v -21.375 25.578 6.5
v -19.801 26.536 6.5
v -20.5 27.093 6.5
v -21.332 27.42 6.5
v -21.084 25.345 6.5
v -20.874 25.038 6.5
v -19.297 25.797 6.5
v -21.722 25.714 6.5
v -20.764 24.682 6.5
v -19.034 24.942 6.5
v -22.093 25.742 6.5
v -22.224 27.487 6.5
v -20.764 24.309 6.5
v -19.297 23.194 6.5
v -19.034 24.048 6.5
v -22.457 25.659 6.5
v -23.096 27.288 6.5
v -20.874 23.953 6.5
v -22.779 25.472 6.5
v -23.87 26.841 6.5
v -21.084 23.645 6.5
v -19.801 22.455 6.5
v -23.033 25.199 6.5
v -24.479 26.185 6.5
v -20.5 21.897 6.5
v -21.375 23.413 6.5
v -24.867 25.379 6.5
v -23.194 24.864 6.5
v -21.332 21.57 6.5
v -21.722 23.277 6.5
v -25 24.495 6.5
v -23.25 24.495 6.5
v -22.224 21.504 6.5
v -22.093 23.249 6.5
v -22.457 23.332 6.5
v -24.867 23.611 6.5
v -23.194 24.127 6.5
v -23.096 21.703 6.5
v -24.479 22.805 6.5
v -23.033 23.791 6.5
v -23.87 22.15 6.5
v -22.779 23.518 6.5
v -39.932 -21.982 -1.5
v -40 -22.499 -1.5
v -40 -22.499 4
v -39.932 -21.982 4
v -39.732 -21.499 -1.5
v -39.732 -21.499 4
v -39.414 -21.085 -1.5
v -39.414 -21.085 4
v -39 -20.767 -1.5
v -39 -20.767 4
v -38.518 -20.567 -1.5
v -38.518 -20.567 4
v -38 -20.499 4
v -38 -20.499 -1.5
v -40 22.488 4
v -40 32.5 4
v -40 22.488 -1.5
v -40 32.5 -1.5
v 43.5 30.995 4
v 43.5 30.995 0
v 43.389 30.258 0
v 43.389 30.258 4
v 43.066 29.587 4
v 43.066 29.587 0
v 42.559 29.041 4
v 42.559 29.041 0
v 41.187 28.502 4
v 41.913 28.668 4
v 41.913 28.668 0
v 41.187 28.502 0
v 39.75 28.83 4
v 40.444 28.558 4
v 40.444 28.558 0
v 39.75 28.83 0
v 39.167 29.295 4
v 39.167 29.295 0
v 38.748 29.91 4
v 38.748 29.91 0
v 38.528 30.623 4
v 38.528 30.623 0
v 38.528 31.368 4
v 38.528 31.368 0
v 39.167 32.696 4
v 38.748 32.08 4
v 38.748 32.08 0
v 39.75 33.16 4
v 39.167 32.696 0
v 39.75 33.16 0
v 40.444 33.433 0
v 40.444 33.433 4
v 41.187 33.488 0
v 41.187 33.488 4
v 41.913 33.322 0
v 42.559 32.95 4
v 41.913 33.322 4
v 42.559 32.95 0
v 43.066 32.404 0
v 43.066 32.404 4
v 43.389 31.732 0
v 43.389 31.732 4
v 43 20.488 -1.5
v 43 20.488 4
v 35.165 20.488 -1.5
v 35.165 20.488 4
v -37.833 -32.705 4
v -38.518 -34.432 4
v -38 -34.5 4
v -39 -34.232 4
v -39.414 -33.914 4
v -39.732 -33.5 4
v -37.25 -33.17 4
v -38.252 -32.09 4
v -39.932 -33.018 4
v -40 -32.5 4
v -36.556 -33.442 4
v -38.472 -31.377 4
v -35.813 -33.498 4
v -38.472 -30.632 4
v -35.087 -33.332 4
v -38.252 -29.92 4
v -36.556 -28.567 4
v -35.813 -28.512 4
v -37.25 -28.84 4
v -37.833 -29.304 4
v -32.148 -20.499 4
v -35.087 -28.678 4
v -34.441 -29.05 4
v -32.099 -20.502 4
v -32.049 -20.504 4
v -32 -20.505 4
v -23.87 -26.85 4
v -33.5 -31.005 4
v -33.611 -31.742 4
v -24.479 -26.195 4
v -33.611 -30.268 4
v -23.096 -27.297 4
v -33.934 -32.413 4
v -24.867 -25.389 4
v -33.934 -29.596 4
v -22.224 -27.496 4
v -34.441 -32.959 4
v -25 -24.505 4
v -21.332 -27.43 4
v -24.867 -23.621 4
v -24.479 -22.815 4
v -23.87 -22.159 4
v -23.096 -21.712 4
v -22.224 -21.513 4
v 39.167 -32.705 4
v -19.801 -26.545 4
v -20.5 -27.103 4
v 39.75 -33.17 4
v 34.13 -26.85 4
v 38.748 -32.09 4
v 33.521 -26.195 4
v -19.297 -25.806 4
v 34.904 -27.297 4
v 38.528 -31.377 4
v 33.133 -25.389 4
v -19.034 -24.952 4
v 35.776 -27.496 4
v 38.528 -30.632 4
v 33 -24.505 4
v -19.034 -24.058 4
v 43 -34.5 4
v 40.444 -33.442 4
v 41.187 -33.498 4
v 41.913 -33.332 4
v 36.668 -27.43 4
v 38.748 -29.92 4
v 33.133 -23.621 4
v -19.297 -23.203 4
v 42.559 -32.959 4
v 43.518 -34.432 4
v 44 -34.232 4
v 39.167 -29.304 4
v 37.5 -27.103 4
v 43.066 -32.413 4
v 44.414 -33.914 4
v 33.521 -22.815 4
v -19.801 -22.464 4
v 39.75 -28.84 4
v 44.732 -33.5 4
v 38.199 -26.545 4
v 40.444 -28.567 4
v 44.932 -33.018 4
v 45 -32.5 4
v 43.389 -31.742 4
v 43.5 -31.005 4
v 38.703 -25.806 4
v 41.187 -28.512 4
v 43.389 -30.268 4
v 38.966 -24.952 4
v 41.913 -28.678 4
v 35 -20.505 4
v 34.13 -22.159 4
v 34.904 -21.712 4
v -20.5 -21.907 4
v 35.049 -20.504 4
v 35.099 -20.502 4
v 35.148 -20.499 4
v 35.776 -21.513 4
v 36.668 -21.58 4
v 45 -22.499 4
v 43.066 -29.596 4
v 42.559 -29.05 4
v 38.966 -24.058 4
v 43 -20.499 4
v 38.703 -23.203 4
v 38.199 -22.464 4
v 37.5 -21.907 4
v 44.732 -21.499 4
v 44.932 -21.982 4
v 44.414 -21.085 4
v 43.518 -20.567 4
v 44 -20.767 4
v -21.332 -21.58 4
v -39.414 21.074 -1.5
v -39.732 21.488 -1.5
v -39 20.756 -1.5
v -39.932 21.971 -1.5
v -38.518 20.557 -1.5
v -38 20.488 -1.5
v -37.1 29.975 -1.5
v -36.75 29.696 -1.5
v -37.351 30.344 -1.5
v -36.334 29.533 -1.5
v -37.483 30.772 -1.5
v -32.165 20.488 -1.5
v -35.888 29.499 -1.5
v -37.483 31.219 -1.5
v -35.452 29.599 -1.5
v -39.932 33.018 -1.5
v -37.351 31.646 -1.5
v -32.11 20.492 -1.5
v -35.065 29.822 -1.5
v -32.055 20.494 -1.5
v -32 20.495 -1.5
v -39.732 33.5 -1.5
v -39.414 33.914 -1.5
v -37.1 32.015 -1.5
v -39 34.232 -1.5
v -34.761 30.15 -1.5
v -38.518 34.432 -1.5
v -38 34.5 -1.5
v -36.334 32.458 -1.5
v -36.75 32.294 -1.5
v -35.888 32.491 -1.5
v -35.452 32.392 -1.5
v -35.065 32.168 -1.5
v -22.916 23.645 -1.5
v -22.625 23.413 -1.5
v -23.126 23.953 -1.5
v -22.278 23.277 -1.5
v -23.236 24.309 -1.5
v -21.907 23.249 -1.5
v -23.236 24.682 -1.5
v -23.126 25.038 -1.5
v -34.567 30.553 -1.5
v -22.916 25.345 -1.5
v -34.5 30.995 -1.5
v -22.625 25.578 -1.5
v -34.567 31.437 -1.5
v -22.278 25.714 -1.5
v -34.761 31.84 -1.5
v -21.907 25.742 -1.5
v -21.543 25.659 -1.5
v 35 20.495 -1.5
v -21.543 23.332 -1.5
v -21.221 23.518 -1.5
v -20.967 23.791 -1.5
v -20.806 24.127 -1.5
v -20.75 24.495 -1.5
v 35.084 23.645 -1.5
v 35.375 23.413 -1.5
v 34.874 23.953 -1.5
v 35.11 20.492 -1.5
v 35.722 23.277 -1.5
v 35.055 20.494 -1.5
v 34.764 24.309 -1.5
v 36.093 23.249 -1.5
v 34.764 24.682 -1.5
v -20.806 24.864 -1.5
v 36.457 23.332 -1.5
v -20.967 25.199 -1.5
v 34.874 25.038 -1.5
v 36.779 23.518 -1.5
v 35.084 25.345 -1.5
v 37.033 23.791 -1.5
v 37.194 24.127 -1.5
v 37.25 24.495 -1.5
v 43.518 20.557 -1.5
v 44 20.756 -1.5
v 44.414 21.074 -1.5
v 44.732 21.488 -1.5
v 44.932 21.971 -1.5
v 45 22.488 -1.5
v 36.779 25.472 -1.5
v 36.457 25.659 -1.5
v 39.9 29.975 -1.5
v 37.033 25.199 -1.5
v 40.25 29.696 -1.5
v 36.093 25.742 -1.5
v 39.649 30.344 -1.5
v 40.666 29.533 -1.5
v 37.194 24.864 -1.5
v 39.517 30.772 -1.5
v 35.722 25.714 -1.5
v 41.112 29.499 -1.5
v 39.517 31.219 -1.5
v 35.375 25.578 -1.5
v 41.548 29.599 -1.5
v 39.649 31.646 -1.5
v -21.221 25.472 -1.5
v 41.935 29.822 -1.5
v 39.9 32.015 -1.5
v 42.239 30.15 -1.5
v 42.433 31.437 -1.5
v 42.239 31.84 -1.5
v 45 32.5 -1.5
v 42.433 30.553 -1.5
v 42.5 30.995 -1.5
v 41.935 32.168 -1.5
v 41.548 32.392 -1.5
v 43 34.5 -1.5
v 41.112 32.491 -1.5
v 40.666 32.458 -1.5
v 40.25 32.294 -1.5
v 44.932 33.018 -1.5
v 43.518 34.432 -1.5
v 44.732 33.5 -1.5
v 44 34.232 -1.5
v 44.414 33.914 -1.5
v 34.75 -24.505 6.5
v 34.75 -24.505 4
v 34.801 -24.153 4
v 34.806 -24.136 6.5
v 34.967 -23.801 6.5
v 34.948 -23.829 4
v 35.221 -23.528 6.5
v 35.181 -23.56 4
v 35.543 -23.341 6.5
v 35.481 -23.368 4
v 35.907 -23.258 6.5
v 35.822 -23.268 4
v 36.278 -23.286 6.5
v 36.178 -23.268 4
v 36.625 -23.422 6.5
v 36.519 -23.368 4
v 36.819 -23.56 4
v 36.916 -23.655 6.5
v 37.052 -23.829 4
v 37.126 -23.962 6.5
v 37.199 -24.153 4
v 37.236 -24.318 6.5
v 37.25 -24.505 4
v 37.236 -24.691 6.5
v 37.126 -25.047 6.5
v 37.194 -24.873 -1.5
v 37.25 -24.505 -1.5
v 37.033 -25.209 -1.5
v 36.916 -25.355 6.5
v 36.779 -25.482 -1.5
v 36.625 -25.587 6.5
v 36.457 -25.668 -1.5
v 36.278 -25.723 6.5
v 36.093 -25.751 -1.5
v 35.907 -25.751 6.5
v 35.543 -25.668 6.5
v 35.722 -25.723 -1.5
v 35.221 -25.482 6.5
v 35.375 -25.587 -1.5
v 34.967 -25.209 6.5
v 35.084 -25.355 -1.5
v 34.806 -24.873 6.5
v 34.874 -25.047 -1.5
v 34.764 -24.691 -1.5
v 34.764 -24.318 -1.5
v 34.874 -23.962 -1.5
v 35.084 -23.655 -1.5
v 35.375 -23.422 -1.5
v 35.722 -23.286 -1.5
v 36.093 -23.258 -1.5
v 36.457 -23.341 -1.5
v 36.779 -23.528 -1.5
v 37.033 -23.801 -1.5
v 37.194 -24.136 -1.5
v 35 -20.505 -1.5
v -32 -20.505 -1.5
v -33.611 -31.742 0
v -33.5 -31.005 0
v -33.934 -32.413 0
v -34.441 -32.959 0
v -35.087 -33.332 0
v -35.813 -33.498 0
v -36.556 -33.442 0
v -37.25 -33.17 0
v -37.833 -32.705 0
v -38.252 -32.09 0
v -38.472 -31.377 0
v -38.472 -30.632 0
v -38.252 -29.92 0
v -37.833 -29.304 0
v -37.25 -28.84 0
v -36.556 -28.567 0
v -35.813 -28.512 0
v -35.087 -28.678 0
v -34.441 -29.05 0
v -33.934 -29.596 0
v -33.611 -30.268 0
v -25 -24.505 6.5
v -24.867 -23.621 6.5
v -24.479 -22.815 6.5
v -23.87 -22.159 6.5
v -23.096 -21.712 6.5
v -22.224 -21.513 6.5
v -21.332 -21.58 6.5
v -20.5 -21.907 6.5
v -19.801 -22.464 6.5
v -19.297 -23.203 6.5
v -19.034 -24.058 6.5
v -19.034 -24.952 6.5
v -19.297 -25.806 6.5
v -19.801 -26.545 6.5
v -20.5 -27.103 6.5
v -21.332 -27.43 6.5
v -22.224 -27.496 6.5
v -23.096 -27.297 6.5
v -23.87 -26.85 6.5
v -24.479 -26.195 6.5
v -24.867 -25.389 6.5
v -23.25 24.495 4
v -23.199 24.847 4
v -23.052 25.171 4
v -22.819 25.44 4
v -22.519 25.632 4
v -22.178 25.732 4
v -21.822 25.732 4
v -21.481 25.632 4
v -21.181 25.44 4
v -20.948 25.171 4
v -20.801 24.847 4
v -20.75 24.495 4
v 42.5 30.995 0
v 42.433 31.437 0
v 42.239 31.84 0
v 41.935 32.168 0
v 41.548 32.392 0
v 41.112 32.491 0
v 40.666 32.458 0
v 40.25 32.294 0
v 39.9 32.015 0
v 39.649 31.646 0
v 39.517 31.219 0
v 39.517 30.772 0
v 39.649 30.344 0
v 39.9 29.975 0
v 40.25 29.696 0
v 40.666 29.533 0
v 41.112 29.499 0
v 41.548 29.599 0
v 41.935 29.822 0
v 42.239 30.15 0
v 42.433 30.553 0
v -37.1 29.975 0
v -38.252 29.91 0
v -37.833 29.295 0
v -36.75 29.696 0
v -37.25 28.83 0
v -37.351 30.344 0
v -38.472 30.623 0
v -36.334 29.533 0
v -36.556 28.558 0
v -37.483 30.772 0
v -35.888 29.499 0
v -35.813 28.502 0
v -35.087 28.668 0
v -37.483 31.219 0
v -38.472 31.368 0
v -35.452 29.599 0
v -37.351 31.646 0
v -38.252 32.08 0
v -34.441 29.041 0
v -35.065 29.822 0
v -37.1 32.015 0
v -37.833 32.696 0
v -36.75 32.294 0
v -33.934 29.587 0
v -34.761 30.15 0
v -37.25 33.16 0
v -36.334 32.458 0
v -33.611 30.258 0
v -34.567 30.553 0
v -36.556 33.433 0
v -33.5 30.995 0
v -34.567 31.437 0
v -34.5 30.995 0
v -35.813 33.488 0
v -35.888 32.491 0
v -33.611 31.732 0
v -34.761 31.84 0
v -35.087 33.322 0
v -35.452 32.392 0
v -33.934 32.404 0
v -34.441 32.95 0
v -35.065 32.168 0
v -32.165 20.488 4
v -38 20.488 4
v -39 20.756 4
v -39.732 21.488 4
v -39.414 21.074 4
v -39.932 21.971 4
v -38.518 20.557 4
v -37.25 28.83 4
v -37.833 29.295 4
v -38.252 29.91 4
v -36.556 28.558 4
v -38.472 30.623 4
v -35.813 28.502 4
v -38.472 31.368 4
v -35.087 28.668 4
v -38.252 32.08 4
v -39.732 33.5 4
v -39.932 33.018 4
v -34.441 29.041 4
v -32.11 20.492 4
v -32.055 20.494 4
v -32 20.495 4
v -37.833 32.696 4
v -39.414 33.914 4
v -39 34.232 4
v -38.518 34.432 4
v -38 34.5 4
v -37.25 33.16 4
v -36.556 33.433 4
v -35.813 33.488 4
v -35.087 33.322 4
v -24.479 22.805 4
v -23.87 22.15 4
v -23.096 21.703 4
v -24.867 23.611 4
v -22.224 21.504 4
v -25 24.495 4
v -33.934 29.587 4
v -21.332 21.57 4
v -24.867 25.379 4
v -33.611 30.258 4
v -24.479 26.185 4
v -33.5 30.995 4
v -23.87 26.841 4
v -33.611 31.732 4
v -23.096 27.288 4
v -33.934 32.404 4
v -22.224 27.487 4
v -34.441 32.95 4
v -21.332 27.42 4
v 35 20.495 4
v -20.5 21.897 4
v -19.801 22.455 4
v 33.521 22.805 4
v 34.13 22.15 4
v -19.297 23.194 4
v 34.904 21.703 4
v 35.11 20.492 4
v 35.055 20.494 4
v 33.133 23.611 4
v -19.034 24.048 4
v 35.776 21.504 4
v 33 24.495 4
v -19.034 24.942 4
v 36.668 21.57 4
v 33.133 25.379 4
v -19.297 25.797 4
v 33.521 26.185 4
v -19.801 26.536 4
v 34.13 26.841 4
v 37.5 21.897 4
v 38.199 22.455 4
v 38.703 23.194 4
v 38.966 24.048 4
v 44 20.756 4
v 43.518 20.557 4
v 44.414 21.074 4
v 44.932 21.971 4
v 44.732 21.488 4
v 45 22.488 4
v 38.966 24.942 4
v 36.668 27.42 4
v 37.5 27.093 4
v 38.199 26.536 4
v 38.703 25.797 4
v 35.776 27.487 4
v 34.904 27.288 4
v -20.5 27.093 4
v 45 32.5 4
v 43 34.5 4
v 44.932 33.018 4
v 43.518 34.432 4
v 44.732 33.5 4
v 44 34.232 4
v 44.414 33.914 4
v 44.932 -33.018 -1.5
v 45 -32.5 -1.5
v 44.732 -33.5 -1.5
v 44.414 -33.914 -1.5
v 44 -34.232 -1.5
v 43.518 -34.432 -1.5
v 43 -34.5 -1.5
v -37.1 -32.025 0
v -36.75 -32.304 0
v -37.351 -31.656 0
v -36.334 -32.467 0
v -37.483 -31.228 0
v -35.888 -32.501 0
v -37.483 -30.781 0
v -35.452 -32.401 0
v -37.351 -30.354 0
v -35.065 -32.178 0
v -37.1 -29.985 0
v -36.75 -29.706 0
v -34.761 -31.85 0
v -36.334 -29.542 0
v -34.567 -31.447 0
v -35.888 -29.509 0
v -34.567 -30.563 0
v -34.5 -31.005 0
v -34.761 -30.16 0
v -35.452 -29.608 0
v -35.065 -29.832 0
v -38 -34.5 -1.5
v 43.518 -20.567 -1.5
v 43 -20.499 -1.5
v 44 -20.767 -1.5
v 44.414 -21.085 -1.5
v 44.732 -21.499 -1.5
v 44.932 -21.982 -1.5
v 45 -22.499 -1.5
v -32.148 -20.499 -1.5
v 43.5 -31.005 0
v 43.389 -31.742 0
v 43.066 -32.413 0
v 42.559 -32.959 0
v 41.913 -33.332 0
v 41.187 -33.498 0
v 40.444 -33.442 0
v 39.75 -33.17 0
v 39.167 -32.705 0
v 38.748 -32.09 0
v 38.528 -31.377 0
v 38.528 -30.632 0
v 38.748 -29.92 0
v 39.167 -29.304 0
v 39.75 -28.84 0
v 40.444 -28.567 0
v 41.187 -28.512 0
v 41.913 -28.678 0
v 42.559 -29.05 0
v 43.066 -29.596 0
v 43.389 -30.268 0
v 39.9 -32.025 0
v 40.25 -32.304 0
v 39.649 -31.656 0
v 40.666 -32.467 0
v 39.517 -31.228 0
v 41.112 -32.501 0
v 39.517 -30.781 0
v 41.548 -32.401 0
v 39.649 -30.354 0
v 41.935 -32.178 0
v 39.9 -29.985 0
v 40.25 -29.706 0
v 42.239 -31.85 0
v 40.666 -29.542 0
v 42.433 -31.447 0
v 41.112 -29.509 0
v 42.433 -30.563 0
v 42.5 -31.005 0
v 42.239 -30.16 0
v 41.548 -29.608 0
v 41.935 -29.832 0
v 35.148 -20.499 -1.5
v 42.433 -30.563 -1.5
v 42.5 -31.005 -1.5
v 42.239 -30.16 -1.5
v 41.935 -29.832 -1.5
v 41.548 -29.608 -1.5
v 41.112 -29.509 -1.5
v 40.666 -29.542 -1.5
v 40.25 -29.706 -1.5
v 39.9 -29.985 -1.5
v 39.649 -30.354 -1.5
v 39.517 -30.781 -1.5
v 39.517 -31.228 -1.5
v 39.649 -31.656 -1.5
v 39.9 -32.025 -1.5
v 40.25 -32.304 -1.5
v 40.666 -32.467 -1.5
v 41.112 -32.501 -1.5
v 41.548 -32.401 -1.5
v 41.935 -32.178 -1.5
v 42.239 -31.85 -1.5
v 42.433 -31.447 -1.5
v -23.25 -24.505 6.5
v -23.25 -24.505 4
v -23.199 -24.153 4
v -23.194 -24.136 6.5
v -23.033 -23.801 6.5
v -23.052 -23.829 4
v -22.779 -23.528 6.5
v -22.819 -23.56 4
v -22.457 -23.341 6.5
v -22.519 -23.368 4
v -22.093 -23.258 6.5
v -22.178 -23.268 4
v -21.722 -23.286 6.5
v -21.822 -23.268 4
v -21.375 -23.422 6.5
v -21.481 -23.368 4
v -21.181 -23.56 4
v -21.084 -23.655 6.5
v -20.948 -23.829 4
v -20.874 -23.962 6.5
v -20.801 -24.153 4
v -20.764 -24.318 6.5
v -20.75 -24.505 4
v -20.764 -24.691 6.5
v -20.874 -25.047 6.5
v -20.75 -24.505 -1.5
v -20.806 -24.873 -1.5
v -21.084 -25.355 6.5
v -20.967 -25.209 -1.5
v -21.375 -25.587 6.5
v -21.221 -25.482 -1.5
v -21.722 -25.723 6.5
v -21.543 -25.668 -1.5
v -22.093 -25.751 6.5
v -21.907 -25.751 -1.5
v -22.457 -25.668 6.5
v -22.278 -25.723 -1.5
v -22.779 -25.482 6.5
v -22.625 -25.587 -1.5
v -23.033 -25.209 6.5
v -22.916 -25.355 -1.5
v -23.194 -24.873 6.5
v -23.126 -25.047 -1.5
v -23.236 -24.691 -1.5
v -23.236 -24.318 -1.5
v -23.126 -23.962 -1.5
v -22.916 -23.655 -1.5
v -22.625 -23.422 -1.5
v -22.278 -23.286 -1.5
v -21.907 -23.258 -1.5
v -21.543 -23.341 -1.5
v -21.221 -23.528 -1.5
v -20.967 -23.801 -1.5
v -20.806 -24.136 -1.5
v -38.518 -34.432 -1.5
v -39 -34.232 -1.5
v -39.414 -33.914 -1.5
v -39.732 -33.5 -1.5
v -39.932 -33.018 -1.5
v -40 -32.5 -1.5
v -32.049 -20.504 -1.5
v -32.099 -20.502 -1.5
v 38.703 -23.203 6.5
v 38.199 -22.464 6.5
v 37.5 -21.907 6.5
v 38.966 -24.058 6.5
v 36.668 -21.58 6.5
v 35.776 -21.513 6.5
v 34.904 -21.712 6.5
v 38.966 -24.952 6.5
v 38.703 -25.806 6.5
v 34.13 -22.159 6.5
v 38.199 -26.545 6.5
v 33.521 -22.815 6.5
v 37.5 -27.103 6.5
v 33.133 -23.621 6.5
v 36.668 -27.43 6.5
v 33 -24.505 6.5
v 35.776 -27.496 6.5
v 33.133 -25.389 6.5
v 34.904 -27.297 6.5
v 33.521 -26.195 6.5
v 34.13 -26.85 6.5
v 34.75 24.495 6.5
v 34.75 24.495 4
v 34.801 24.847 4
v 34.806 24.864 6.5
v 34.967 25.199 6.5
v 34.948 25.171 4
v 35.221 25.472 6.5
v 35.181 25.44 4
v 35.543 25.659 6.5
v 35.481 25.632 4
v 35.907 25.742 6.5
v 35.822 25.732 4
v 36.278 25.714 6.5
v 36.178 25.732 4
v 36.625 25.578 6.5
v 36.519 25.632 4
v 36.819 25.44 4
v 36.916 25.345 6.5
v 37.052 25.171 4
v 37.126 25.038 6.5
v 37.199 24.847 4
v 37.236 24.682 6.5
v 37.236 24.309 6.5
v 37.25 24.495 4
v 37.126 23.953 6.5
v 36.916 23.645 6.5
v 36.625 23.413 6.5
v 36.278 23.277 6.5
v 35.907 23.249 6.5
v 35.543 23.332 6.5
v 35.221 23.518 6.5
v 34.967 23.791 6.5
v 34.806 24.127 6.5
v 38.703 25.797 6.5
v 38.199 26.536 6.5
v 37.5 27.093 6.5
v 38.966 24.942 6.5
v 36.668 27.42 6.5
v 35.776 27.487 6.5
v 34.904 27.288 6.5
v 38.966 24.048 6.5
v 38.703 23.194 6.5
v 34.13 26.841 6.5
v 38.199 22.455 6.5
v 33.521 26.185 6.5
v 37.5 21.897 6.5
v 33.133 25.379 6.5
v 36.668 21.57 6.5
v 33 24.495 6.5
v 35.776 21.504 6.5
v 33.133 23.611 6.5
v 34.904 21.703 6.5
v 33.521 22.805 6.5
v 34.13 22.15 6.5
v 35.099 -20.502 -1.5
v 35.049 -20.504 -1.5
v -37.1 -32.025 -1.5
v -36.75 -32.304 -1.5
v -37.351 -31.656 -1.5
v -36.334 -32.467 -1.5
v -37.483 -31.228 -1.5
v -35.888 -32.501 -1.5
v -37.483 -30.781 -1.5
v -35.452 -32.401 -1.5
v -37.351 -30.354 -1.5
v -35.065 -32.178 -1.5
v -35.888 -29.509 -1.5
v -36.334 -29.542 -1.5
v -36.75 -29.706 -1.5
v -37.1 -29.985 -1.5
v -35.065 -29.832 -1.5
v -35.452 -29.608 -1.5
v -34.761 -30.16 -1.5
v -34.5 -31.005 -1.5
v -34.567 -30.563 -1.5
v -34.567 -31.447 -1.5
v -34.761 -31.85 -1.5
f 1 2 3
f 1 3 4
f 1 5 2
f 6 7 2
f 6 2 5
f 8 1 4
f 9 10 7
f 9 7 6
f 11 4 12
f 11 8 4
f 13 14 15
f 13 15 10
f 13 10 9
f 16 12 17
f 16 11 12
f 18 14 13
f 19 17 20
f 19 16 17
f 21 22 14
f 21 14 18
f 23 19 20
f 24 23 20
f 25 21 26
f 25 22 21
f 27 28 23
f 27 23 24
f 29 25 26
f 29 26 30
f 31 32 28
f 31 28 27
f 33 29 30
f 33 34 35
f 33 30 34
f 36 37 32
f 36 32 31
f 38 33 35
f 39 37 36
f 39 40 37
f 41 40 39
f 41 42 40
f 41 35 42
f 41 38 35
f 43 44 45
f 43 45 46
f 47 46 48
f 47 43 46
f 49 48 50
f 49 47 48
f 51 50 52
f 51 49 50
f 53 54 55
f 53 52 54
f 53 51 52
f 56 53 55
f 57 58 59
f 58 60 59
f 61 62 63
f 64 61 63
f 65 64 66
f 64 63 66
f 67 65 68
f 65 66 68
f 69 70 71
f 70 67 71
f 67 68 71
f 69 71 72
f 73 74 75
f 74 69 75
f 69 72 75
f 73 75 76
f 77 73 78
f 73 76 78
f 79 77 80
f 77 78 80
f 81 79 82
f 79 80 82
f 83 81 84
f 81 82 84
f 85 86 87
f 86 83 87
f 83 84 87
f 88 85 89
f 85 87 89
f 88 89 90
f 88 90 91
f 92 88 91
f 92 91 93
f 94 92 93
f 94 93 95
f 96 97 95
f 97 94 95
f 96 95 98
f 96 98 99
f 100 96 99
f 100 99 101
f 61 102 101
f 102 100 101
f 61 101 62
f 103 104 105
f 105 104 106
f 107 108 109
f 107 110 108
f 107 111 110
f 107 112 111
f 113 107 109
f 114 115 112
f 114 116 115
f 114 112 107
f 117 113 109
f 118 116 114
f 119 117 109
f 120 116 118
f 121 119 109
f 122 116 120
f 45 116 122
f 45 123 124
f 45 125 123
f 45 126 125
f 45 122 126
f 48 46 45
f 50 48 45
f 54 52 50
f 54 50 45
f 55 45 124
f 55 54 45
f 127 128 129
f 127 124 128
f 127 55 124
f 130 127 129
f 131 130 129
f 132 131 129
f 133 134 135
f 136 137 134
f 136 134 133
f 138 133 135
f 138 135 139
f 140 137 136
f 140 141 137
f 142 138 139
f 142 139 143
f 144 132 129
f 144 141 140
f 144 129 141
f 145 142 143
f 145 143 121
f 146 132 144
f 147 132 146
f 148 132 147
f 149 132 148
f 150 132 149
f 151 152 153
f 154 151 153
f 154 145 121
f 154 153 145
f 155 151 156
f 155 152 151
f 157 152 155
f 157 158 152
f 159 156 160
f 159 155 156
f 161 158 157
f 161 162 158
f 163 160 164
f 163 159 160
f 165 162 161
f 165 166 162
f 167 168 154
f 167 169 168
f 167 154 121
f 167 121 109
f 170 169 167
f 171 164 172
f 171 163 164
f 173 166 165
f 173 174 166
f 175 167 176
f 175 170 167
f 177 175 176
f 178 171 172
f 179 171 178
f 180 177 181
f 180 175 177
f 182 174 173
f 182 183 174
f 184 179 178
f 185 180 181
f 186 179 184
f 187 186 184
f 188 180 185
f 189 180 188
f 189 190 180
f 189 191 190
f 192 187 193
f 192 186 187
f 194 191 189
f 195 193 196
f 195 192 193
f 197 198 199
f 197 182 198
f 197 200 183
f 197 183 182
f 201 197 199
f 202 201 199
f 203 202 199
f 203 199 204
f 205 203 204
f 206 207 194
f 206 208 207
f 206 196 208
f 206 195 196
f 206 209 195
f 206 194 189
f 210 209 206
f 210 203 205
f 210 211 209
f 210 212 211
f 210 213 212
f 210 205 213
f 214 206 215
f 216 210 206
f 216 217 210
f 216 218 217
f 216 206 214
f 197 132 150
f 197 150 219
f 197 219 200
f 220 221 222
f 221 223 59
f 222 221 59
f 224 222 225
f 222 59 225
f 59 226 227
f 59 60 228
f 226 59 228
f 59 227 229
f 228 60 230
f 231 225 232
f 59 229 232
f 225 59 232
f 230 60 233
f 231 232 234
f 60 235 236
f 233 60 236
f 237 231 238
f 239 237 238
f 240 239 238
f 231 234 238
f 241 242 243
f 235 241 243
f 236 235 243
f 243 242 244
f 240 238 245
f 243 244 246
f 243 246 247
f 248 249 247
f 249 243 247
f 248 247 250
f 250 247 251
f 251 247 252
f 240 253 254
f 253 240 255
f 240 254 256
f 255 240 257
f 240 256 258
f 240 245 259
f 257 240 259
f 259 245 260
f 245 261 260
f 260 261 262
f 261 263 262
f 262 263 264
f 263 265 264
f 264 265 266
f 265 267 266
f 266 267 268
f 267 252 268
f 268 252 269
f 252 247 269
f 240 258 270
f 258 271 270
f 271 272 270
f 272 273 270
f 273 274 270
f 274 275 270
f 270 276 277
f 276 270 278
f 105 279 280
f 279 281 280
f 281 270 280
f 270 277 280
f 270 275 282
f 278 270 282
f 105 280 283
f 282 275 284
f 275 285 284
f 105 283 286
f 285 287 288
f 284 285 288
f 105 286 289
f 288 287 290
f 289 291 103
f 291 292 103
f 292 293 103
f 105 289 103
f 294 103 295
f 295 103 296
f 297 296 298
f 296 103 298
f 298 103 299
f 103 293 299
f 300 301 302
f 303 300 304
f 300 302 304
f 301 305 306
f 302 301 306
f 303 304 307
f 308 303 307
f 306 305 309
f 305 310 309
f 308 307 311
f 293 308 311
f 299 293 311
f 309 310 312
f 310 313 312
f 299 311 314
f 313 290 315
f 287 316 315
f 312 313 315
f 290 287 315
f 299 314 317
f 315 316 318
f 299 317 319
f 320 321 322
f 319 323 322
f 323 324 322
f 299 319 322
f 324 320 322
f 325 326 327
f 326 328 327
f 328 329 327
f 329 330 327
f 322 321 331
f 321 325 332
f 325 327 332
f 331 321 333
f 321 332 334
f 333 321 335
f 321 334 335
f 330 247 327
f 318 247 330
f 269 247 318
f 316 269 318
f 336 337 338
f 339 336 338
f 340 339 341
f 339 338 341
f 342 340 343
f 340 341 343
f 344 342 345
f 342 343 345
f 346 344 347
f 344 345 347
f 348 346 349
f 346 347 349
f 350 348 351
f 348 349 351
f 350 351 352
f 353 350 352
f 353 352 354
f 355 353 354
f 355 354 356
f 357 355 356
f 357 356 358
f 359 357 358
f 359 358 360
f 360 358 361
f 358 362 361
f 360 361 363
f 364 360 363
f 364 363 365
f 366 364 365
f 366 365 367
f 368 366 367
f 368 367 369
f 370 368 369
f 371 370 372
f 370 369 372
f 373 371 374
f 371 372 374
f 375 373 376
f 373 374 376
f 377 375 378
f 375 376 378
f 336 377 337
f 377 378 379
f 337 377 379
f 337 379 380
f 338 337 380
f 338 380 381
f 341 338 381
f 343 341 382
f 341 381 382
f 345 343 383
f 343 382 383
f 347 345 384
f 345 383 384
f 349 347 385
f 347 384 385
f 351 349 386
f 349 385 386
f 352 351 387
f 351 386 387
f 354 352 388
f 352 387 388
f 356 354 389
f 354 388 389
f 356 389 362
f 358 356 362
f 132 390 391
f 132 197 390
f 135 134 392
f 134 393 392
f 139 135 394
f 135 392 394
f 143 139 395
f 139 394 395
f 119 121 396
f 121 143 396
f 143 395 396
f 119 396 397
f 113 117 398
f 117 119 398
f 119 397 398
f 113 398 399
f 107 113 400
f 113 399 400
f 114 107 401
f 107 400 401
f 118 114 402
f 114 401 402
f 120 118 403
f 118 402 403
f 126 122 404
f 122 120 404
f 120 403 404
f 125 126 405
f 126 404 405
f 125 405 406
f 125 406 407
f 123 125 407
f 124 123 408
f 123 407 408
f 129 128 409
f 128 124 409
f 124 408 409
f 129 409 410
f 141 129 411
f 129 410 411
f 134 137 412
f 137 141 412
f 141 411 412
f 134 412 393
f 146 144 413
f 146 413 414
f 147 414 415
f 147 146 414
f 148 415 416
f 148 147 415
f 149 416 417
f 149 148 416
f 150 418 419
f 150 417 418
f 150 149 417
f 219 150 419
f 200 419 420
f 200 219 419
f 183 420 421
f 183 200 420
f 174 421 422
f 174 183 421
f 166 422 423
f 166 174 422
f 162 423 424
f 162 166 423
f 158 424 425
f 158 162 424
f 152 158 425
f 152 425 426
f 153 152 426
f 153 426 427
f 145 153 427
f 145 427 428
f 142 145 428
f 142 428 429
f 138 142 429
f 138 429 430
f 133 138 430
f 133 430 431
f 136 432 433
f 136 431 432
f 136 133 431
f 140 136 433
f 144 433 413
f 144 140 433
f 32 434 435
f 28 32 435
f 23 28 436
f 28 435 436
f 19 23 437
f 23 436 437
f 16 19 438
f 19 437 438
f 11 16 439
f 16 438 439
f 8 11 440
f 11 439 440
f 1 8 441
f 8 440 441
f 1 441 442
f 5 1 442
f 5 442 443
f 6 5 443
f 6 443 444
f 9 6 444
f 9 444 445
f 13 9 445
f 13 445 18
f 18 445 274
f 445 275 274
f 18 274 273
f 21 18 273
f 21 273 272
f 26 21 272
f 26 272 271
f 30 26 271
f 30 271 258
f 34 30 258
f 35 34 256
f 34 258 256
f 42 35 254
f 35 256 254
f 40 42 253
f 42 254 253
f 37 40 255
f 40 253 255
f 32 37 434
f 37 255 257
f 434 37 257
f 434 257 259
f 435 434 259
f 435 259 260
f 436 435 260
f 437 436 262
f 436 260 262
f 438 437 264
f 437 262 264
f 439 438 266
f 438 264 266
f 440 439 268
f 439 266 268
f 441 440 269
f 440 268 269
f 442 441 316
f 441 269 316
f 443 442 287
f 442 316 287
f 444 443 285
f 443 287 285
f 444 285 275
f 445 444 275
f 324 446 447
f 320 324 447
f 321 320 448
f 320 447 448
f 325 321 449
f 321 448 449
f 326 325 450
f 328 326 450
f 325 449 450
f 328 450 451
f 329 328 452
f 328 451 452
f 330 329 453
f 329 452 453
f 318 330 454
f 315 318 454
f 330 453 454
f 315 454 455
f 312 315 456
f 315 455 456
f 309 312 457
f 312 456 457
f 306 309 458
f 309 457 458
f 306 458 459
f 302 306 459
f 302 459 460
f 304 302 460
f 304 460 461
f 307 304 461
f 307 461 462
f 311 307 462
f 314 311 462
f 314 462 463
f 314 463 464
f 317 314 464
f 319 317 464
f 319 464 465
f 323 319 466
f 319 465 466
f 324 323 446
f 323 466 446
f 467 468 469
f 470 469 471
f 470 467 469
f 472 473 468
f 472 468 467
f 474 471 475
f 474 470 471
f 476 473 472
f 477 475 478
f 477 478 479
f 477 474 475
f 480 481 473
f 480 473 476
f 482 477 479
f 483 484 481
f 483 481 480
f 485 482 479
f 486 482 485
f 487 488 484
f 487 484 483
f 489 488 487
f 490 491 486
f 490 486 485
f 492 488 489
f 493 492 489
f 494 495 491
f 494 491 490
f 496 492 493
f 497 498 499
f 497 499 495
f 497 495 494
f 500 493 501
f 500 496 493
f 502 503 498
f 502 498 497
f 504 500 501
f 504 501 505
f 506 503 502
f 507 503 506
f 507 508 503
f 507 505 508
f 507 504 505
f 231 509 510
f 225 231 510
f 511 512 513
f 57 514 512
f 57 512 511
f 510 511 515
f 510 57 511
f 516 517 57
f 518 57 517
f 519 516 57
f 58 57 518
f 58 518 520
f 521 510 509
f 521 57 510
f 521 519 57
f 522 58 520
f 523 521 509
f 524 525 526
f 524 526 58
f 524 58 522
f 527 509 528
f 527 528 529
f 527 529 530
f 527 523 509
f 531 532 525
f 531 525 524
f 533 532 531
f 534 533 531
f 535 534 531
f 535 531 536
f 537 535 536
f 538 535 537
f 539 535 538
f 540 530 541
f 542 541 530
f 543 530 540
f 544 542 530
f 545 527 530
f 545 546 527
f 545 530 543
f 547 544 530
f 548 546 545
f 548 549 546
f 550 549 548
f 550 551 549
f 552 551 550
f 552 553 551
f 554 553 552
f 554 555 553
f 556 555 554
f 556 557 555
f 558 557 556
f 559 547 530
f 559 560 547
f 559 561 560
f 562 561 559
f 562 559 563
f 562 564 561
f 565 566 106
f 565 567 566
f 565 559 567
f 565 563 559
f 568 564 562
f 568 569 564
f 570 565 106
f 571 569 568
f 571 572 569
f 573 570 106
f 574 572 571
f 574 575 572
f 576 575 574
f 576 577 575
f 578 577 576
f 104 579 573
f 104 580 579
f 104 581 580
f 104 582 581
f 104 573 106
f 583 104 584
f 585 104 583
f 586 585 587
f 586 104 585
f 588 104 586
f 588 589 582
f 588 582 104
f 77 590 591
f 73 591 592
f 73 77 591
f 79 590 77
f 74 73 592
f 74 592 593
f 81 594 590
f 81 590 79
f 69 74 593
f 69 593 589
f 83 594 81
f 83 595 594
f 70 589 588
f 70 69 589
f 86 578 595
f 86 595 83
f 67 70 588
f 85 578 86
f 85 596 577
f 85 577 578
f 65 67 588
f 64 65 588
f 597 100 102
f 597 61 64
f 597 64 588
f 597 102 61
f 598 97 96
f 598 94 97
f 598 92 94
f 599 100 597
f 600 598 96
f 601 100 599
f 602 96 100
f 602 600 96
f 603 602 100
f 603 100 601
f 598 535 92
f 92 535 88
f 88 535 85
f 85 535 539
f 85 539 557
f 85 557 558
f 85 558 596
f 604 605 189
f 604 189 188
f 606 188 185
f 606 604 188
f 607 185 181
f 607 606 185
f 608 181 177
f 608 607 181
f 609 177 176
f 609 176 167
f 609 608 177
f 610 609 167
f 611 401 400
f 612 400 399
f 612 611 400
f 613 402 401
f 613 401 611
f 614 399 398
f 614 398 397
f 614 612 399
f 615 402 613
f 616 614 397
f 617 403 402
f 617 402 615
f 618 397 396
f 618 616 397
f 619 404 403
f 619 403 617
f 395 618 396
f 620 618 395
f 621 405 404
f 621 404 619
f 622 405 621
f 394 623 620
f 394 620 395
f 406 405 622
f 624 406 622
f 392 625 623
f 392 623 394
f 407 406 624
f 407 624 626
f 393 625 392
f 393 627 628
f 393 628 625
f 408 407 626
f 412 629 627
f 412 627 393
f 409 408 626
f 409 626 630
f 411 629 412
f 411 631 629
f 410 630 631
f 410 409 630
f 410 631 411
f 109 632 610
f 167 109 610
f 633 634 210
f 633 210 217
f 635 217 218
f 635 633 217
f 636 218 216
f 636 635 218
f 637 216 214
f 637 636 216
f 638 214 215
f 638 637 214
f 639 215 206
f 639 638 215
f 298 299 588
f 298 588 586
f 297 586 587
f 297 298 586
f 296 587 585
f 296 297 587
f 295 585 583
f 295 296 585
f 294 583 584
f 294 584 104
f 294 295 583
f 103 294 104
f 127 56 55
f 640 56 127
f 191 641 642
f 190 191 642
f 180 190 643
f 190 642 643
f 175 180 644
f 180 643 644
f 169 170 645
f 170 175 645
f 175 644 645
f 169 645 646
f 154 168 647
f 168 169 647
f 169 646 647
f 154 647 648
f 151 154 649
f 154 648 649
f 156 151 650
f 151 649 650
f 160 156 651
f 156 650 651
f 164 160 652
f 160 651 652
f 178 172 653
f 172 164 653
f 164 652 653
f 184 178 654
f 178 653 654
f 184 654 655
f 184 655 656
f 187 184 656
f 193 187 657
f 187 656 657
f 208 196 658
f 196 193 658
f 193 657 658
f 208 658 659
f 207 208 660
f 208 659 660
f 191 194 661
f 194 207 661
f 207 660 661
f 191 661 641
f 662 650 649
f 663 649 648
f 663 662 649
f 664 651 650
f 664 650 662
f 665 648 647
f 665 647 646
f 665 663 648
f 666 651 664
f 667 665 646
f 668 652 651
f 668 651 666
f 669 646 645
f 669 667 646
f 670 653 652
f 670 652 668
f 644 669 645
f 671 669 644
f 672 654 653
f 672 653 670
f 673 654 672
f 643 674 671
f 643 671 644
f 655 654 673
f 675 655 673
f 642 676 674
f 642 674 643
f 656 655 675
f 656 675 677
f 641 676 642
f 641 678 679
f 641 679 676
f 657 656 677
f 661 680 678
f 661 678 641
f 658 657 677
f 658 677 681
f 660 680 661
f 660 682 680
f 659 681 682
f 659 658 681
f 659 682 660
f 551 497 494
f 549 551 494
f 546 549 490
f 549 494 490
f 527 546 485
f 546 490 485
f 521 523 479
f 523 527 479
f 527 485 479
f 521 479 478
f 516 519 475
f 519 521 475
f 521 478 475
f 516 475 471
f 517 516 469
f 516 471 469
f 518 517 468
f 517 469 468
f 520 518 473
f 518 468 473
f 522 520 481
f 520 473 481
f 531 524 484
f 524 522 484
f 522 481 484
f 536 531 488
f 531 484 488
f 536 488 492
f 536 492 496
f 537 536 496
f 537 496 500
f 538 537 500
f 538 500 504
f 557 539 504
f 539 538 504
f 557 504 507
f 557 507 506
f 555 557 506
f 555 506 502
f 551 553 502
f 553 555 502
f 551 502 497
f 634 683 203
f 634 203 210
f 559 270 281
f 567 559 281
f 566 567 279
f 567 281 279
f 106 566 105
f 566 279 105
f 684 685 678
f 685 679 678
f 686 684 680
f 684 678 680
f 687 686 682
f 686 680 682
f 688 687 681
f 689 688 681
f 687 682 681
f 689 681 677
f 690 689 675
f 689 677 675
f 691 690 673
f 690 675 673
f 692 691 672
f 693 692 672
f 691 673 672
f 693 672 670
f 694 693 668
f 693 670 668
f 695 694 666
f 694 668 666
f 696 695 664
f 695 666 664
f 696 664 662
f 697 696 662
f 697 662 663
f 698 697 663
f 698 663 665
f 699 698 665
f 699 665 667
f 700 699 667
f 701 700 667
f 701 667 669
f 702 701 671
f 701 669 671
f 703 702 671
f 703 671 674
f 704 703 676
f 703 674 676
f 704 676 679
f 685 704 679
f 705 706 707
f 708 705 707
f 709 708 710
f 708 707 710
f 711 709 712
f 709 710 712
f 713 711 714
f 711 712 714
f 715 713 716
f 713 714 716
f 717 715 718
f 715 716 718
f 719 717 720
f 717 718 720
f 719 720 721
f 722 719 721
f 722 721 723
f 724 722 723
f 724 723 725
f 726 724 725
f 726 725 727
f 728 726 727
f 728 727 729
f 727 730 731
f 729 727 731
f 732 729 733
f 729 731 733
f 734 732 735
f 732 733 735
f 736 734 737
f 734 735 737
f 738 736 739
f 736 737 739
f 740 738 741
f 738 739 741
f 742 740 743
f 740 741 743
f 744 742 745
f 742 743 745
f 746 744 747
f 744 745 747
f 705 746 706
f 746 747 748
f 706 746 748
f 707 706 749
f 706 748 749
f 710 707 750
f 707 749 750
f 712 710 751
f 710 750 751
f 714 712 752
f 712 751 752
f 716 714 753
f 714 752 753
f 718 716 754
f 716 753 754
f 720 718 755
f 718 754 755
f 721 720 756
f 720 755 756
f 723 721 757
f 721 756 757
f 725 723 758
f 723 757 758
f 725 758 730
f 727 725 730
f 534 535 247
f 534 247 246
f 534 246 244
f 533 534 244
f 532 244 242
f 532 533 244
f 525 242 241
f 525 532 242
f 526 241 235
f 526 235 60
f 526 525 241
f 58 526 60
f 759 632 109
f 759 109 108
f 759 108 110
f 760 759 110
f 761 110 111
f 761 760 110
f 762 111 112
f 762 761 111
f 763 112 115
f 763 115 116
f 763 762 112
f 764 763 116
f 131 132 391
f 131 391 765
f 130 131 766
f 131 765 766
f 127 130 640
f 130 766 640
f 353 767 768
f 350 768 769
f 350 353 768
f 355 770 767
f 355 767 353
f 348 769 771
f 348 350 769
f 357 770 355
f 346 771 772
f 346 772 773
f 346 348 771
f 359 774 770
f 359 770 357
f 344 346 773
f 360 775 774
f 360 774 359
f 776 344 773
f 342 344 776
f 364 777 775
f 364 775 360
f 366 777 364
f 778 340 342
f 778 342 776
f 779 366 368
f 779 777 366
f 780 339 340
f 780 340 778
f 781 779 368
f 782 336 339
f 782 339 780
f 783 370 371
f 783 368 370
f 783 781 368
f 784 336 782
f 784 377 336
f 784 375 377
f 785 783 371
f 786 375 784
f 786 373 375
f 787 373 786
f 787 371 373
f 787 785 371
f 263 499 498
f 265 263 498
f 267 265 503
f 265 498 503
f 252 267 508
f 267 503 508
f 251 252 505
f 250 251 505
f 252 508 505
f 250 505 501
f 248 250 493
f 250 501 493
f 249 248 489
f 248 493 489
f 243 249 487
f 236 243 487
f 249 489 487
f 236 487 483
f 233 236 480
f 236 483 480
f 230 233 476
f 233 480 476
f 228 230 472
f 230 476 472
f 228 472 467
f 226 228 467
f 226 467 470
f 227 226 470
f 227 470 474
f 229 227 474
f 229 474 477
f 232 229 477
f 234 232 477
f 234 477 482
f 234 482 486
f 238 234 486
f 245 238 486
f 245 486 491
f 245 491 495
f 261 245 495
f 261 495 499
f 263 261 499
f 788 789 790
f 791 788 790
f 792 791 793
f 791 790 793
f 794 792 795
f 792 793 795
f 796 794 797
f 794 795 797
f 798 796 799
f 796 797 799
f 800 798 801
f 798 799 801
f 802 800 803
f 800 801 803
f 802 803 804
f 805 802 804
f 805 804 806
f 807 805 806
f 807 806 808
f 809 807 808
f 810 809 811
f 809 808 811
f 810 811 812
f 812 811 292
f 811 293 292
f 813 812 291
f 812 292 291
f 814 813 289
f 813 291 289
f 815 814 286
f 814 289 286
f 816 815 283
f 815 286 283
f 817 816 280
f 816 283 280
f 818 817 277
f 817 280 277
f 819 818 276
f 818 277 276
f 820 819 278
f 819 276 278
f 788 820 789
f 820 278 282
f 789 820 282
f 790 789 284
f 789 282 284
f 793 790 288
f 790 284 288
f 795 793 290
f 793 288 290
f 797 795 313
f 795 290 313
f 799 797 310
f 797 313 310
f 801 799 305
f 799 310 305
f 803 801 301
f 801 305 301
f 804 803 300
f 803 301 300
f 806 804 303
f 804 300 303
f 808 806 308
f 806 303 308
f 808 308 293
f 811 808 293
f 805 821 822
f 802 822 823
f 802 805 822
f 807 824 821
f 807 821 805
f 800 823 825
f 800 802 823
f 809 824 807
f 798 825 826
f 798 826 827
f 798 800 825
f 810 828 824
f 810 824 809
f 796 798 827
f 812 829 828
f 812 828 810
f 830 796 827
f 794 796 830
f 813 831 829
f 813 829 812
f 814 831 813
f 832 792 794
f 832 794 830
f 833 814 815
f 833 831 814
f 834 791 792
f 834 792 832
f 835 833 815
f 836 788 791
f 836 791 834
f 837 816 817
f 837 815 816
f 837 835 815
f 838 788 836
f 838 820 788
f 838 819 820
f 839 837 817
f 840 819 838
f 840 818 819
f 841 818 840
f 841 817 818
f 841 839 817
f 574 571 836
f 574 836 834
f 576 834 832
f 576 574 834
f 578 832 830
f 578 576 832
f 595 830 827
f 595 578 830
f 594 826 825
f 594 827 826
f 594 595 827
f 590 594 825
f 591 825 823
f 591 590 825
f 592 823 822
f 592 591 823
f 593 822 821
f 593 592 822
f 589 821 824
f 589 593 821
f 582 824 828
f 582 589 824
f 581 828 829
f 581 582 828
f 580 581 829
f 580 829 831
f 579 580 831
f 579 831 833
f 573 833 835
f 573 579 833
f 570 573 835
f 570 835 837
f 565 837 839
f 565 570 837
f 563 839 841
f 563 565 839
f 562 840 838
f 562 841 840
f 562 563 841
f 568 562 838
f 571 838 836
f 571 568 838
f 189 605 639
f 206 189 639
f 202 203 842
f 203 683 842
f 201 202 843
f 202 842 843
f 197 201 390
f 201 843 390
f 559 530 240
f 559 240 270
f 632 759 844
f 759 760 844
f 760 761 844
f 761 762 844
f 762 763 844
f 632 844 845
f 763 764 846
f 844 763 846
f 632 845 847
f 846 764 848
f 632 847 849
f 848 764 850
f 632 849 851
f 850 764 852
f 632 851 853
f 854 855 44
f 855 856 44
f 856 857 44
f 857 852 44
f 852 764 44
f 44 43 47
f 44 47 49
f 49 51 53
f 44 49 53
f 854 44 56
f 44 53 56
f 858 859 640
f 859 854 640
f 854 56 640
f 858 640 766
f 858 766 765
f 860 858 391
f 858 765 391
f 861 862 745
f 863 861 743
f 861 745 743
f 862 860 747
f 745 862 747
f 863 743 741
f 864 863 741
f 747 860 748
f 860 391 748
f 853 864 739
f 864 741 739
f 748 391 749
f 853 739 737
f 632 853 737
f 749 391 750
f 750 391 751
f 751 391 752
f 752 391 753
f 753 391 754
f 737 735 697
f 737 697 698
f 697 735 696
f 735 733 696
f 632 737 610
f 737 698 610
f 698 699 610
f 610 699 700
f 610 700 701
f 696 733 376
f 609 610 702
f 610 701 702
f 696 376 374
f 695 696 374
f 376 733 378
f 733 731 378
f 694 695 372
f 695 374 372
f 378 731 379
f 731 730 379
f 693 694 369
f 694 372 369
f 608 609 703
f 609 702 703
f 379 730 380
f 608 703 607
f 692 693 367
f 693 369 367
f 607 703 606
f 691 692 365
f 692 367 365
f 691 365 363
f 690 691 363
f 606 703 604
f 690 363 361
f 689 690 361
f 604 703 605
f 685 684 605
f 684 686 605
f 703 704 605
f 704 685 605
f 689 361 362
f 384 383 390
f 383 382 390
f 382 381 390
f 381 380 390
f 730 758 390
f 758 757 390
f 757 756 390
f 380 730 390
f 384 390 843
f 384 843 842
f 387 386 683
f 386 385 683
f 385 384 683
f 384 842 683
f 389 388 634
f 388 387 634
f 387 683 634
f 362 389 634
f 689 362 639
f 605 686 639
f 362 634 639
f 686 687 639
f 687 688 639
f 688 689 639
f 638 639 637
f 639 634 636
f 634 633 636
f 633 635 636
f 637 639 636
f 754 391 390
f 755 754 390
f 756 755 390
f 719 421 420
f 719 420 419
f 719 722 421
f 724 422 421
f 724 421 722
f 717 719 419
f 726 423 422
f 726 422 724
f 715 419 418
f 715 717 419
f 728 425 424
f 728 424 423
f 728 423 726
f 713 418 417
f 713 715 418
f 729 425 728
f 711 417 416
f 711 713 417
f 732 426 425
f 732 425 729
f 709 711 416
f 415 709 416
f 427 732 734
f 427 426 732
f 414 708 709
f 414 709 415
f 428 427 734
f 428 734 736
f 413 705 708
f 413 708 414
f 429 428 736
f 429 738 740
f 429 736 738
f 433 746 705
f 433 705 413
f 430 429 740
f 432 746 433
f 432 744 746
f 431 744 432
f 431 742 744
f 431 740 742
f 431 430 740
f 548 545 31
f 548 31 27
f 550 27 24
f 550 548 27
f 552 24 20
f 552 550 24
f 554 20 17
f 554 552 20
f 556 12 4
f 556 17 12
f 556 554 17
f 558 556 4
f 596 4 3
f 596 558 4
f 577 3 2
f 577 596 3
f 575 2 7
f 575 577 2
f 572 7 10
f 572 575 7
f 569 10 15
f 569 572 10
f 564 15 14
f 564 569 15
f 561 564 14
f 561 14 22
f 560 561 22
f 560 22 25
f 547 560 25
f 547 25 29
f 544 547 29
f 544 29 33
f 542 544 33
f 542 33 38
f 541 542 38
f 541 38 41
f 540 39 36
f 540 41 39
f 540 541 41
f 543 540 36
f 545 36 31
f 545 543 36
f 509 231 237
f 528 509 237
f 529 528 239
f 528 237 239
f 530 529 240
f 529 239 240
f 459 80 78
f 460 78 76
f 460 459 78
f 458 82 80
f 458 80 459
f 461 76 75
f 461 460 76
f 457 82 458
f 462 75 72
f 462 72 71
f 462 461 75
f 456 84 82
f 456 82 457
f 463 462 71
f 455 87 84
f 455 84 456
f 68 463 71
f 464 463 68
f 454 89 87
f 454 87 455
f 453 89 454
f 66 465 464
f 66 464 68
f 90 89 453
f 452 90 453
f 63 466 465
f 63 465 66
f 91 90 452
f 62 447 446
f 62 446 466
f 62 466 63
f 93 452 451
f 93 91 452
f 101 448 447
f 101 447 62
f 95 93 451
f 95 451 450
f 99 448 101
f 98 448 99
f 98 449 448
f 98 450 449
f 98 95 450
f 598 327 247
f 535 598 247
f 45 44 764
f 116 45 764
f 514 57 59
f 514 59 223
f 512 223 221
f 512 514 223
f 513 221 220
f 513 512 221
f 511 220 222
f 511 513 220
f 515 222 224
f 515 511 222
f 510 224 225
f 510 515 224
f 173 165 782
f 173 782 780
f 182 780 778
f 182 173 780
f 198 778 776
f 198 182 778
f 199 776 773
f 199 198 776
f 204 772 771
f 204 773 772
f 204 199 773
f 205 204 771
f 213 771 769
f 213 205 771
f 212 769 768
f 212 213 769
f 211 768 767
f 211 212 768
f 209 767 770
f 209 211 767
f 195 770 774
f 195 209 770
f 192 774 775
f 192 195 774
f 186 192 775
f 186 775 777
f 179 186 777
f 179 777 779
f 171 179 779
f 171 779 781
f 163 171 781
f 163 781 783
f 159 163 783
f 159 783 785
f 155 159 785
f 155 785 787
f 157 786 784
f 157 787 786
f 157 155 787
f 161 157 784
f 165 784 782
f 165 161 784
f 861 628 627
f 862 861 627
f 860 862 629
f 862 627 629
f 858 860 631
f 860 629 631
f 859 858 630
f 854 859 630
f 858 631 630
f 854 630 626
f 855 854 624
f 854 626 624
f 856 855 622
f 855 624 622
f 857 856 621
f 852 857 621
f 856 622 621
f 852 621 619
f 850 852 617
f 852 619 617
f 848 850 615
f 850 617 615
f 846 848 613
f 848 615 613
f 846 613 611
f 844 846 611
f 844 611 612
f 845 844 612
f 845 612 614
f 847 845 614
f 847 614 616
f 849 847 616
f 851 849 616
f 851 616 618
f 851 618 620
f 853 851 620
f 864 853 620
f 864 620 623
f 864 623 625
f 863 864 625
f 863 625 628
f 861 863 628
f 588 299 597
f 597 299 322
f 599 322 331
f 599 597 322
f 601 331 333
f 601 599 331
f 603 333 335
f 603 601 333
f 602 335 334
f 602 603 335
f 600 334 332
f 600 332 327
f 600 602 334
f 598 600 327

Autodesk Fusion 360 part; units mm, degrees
sketch "Sketch1" plane through (0, 0, 0) normal (0, 0, 1) x (1, 0, 0)
  line L0 (45, 34.5) -> (-40, 34.5)
  line L1 (-40, 34.5) -> (-40, -34.5)
  line L2 (-40, -34.5) -> (45, -34.5)
  line L3 (45, -34.5) -> (45, 34.5)
  circle A0 centre (41, 30.9952) radius 1.5
  line L4 (0, 56) -> (0, -61) construction
  line L5 (-71, -0.0048) -> (62, -0.0048) construction
  circle A1 centre (41, 30.9952) radius 2.5
  circle A2 centre (-36, 30.9952) radius 1.5
  circle A3 centre (-36, 30.9952) radius 2.5
  circle A4 centre (41, -31.0048) radius 1.5
  circle A5 centre (41, -31.0048) radius 2.5
  circle A6 centre (-36, -31.0048) radius 1.5
  circle A7 centre (-36, -31.0048) radius 2.5
  circle A8 centre (36, 24.4952) radius 1.25
  circle A9 centre (-22, 24.4952) radius 1.25
  circle A10 centre (36, -24.5048) radius 1.25
  circle A11 centre (-22, -24.5048) radius 1.25
  dimension "d1" = 85
  dimension "d2" = 69
  dimension "d3" = 3
  dimension "d8" = 5
  dimension "d13" = 2.5
  dimension "d14" = 24.5
  dimension "d17" = -58
  dimension "d18" = -49
  dimension "d45" = 41
  dimension "d46" = 41
  dimension "d47" = 41
extrude "Extrude1" add sketch "Sketch1" against normal blind 1.5 contours L0 L1 L2 L3 | A1 | A3 | A5 | A7 makes body 1
extrude "Extrude2" add sketch "Sketch1" along normal blind 4 contours L0 L1 L2 L3 bodies 1
fillet "Fillet1" radius 2 4 edges at (-40, -34.5, 1.25) (45, -34.5, 1.25) (45, 34.5, 1.25) (-40, 34.5, 1.25) on bodies 1
sketch "Sketch2" plane through (0, 0, 4) normal (0, 0, 1) x (-1, 0, 0)
  circle A0 centre (22, 24.5048) radius 1.25
  circle A1 centre (22, -24.4952) radius 1.25
  circle A2 centre (-36, 24.5048) radius 1.25
  circle A3 centre (-41, 31.0048) radius 2.5
  circle A4 centre (36, -30.9952) radius 2.5
  circle A5 centre (-36, -24.4952) radius 1.25
  circle A6 centre (36, 31.0048) radius 2.5
  circle A7 centre (-41, -30.9952) radius 2.5
  arc A8 (38, -34.5) -> (40, -32.5) centre (38, -32.5) ccw
  line L0 (40, -32.5) -> (40, 32.5)
  arc A9 (40, 32.5) -> (38, 34.5) centre (38, 32.5) ccw
  line L1 (38, 34.5) -> (-43, 34.5)
  arc A10 (-43, 34.5) -> (-45, 32.5) centre (-43, 32.5) ccw
  line L2 (-45, 32.5) -> (-45, -32.5)
  arc A11 (-45, -32.5) -> (-43, -34.5) centre (-43, -32.5) ccw
  line L3 (-43, -34.5) -> (38, -34.5)
  line L4 (34, -20.4952) -> (-37, -20.4952)
  line L5 (-37, -20.4952) -> (-37, 20.5048)
  line L6 (-37, 20.5048) -> (34, 20.5048)
  line L7 (34, 20.5048) -> (34, -20.4952)
  dimension "d28" = 4
  dimension "d29" = 6
  dimension "d30" = 8
extrude "Extrude3" cut sketch "Sketch2" against normal blind 5.5 contours L4 L5 L6 L7 bodies 1
fillet "Fillet2" radius 2 4 edges at (-34, 20.4952, 1.25) (-34, -20.5048, 1.25) (37, -20.5048, 1.25) (37, 20.4952, 1.25) on bodies 1
sketch "Sketch3" plane through (0, 0, 4) normal (0, 0, 1) x (-1, 0, 0)
  line L0 (-37, -18.4952) -> (-37, 18.5048)
  arc A0 (-35, 20.5048) -> (-37, 18.5048) centre (-35, 18.5048) ccw
  line L1 (-35, 20.5048) -> (32, 20.5048)
  arc A1 (34, 18.5048) -> (32, 20.5048) centre (32, 18.5048) ccw
  line L2 (34, 18.5048) -> (34, -18.4952)
  arc A2 (32, -20.4952) -> (34, -18.4952) centre (32, -18.4952) ccw
  line L3 (32, -20.4952) -> (-35, -20.4952)
  arc A3 (-37, -18.4952) -> (-35, -20.4952) centre (-35, -18.4952) ccw
  circle A4 centre (22, 24.5048) radius 1.25
  circle A5 centre (22, -24.4952) radius 1.25
  circle A6 centre (-36, 24.5048) radius 1.25
  circle A7 centre (-41, 31.0048) radius 2.5
  circle A8 centre (36, -30.9952) radius 2.5
  circle A9 centre (-36, -24.4952) radius 1.25
  circle A10 centre (36, 31.0048) radius 2.5
  circle A11 centre (-41, -30.9952) radius 2.5
  arc A12 (38, -34.5) -> (40, -32.5) centre (38, -32.5) ccw
  line L4 (40, -32.5) -> (40, 32.5)
  arc A13 (40, 32.5) -> (38, 34.5) centre (38, 32.5) ccw
  line L5 (38, 34.5) -> (-43, 34.5)
  arc A14 (-43, 34.5) -> (-45, 32.5) centre (-43, 32.5) ccw
  line L6 (-45, 32.5) -> (-45, -32.5)
  arc A15 (-45, -32.5) -> (-43, -34.5) centre (-43, -32.5) ccw
  line L7 (-43, -34.5) -> (38, -34.5)
  circle A16 centre (22, -24.4952) radius 3
  circle A17 centre (-36, -24.4952) radius 3
  circle A18 centre (22, 24.5048) radius 3
  circle A19 centre (-36, 24.5048) radius 3
  dimension "d35" = 6
  dimension "d38" = -58
  dimension "d39" = 49
extrude "Extrude4" add sketch "Sketch3" along normal blind 2.5 contours A16 | A17 | A18 | A19 bodies 1
sketch "Sketch4" plane through (0, 0, 0) normal (0, 0, 1) x (1, 0, 0)
  line L0 (45, 20.4884) -> (-40, 20.4884)
  line L1 (-40, 20.4884) -> (-40, -20.4993)
  line L2 (-40, -20.4993) -> (45, -20.4993)
  line L3 (45, -20.4993) -> (45, 20.4884)
  line L4 (45, -32.5) -> (45, 32.5)
  line L5 (-40, 32.5) -> (-40, -32.5)
extrude "Extrude5" cut sketch "Sketch4" along normal up to surface (4 mm away) bodies 1
extrude "Extrude6" cut sketch "Sketch4" against normal up to surface (1.5 mm away) bodies 1 makes body 2 at (-6.5476, 30.7247, -1.5)
fillet "Fillet3" radius 2 3 edges at (45, -20.4993, 1.25) (-40, 20.4884, 1.25) (45, 20.4884, 1.25) on bodies 1 2
fillet "Fillet4" radius 2 1 edges at (-40, -20.4993, 1.25) on bodies 1
equation "d46 = d45"
equation "d47 = d45"
